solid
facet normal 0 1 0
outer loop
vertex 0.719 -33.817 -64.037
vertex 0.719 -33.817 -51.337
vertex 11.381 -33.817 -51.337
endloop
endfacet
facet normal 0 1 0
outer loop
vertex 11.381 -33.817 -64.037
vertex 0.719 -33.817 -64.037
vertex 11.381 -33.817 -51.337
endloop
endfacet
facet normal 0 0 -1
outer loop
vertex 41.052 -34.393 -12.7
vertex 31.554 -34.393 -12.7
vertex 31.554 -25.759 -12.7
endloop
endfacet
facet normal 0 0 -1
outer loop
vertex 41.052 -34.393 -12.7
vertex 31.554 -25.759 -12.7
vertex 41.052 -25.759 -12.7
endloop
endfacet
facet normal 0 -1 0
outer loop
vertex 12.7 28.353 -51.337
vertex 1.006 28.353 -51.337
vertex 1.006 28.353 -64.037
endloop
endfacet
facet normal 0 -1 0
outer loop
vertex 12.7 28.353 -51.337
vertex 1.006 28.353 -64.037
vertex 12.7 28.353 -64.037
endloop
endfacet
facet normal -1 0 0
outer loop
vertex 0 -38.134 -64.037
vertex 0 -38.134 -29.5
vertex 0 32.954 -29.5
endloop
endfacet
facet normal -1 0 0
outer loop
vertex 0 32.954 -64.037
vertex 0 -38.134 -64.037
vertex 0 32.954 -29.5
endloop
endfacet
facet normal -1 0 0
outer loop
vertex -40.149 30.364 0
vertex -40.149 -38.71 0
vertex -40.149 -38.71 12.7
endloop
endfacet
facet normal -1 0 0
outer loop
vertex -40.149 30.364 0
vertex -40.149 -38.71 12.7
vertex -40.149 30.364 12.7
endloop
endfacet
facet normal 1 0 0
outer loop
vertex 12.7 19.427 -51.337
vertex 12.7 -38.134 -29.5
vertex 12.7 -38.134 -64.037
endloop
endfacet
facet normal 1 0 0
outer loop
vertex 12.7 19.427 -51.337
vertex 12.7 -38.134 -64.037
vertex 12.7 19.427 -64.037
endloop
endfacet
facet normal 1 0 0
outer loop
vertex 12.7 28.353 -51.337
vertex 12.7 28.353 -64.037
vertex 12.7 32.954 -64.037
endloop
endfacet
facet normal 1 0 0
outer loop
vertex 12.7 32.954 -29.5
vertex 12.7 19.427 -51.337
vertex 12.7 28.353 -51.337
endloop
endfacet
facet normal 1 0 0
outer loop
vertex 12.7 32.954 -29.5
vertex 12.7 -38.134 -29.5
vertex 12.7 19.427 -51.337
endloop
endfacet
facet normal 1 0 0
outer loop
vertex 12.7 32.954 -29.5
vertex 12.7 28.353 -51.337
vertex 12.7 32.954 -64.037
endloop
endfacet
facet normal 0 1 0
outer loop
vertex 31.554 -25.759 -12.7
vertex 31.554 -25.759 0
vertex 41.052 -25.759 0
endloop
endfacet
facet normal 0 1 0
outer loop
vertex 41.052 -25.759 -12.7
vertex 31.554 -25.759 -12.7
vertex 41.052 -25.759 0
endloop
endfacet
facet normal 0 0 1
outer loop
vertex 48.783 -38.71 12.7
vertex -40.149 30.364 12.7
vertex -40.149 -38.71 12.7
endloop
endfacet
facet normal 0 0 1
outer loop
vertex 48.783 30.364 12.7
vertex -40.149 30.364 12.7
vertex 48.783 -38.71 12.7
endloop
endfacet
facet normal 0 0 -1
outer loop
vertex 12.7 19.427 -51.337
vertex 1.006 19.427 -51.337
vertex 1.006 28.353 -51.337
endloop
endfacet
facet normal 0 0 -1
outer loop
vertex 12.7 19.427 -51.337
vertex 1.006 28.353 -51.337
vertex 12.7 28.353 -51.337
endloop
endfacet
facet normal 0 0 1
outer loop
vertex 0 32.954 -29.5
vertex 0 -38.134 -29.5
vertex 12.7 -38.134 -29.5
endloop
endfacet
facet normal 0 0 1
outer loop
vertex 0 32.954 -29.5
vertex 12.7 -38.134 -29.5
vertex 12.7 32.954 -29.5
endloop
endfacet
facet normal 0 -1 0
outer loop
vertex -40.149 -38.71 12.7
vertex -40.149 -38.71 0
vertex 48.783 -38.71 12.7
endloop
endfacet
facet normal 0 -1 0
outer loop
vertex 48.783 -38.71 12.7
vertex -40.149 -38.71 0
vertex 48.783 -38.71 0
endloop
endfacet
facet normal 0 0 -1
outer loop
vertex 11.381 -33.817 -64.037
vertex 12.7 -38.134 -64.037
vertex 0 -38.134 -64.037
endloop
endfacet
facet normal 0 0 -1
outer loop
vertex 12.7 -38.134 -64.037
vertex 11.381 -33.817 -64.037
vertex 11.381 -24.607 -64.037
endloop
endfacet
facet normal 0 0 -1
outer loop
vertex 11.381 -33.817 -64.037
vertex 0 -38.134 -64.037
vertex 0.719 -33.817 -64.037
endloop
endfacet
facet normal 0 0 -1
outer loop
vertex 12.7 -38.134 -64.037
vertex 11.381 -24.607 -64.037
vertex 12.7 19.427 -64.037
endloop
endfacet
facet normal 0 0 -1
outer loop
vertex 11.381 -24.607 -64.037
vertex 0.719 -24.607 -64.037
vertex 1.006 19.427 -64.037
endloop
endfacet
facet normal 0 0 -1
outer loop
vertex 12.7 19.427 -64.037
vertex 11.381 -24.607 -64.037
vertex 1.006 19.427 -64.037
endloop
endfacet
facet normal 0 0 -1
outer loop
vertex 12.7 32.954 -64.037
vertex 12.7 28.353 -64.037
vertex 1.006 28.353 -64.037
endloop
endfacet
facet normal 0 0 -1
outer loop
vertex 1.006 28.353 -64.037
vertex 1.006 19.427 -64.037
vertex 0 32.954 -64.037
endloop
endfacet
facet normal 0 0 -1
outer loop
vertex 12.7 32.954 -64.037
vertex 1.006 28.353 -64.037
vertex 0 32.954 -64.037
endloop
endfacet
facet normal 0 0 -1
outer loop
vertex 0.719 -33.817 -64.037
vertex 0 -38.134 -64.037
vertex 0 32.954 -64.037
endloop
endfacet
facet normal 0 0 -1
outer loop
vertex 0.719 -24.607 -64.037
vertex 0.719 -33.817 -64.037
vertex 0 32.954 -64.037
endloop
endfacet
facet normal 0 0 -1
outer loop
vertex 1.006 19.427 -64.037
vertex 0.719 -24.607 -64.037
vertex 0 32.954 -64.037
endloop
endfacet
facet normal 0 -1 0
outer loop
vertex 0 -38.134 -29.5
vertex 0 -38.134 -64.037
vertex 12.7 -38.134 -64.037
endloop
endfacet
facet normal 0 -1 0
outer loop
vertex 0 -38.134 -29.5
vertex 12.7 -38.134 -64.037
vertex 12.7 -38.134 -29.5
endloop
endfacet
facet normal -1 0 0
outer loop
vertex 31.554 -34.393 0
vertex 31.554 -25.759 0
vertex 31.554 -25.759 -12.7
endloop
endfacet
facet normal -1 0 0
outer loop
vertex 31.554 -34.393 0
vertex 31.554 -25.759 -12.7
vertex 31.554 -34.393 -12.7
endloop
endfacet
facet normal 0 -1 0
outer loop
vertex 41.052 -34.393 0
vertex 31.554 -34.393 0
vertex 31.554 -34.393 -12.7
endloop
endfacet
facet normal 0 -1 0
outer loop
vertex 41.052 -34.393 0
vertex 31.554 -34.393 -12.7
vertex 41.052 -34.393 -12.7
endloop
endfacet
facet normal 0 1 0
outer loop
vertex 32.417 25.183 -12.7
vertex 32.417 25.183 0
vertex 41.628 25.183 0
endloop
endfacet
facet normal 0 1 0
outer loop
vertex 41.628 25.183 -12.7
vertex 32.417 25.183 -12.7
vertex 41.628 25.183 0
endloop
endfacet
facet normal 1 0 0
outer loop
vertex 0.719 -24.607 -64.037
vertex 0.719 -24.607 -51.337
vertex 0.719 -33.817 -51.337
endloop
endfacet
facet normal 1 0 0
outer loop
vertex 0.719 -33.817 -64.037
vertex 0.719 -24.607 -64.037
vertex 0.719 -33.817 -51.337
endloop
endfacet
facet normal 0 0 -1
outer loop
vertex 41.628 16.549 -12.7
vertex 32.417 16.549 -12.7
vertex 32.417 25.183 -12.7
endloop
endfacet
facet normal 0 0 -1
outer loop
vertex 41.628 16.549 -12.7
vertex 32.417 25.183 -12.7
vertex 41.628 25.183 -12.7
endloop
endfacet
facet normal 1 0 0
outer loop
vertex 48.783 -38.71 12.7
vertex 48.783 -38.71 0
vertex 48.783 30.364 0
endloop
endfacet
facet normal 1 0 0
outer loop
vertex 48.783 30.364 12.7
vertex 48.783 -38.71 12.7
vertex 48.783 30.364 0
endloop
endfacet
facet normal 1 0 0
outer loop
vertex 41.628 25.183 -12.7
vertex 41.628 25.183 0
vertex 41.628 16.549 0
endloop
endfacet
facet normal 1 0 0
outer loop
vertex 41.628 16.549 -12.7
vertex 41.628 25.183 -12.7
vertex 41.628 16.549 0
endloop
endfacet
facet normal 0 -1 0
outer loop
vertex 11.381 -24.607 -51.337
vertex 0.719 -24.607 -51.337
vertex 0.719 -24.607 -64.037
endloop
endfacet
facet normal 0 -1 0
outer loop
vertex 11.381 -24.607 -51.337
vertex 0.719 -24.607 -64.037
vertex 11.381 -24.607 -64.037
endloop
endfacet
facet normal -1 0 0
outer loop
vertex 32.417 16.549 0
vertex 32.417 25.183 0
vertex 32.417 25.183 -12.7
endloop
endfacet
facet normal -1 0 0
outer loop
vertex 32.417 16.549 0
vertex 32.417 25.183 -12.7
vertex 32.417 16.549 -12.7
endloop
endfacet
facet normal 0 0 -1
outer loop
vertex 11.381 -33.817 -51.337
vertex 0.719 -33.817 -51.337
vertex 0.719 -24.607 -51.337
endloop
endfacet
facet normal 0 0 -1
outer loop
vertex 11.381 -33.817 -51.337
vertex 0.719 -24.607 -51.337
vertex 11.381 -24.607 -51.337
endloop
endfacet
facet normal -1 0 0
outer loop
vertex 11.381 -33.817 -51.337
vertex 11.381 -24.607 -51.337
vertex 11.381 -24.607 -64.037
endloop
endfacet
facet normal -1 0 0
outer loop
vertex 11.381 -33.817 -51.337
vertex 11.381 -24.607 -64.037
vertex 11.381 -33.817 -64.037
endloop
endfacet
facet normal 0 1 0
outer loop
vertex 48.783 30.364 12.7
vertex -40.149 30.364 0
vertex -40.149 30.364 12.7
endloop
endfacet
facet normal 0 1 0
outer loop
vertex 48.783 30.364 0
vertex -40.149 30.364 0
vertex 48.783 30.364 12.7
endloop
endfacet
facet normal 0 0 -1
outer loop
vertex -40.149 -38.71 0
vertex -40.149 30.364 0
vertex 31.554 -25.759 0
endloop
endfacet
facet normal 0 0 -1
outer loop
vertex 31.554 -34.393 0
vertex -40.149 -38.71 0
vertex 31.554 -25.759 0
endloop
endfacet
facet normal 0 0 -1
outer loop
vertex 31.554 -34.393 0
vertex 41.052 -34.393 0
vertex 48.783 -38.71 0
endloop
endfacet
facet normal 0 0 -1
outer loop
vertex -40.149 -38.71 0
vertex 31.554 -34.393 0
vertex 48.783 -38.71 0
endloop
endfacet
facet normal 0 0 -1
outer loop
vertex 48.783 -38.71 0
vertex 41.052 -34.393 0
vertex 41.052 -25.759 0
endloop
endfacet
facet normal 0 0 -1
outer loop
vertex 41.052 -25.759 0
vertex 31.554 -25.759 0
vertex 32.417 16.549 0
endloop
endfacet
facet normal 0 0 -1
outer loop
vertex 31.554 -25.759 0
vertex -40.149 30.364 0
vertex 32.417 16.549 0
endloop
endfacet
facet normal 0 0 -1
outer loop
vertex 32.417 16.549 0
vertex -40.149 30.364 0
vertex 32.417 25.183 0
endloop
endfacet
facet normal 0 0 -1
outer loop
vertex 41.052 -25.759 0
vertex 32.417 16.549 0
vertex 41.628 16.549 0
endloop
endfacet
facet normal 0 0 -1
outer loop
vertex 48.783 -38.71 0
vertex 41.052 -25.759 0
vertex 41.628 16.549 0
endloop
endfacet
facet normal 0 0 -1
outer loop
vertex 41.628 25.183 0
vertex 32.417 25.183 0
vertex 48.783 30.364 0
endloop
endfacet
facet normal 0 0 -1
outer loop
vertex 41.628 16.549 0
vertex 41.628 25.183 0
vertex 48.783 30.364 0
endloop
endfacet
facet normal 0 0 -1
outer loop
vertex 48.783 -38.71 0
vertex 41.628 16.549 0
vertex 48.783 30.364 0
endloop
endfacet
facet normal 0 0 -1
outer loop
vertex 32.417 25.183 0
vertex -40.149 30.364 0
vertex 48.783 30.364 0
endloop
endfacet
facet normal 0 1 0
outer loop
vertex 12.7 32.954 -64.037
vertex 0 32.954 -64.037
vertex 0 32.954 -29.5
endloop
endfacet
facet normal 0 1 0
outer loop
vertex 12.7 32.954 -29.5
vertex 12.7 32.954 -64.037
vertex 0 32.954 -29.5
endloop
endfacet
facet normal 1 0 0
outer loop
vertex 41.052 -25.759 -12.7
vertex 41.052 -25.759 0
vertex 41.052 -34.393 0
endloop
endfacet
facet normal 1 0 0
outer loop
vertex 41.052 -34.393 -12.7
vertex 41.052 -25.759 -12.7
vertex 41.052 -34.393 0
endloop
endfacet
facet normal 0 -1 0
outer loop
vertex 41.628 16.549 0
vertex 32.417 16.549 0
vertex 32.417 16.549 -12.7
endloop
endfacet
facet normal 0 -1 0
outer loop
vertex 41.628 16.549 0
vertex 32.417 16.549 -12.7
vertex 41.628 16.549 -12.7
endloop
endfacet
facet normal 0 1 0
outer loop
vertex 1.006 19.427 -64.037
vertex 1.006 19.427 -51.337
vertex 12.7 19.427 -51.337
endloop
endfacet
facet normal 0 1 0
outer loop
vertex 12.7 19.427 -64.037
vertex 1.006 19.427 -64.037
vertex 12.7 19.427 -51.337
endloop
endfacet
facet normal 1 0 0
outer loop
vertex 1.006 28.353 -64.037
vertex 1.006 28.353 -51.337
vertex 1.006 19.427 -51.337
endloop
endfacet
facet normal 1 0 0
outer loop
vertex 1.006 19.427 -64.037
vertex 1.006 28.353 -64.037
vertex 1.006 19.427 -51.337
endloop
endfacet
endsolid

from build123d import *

# Parameters (mm, degrees)
F0_W     = 88.931978
F0_H     = 69.073383
F1_DEPTH = 12.7
F2_W     = 9.498369
F2_H     = 8.634174
F2_W_2   = 9.210534
F2_H_2   = 8.634172
F3_DEPTH = 12.7
F4_W     = 71.088024
F4_H     = 34.536689
F5_DEPTH = 12.7
F6_W     = 10.661837
F6_H     = 9.209784
F6_W_2   = 11.694036
F6_H_2   = 8.925818
F7_DEPTH = 12.7


with BuildPart() as f1:
    # F0 (on Top) → F1 (new body)
    with BuildSketch(Plane.XY):
        with Locations((4.317086, -4.173183)):
            Rectangle(F0_W, F0_H)
    extrude(amount=F1_DEPTH)

    # F2 (on face) → F3 (join)
    with BuildSketch(Plane(origin=(0, 0, 0), x_dir=(1, 0, 0), z_dir=(0, 0, -1))):
        with Locations((36.30303, 30.075702)):
            Rectangle(F2_W, F2_H)
        with Locations((37.022602, -20.865917)):
            Rectangle(F2_W_2, F2_H_2)
    extrude(amount=F3_DEPTH)


with BuildPart() as f5:
    # F4 (on Right) → F5 (new body)
    with BuildSketch(Plane.YZ):
        with Locations((-2.59025, -46.768434)):
            Rectangle(F4_W, F4_H)
    extrude(amount=F5_DEPTH)

    # F6 (on face) → F7 (cut)
    with BuildSketch(Plane(origin=(0, 0, -64.036779), x_dir=(1, 0, 0), z_dir=(0, 0, -1))):
        with Locations((6.049875, 29.212284)):
            Rectangle(F6_W, F6_H)
        with Locations((6.852982, -23.889797)):
            Rectangle(F6_W_2, F6_H_2)
    extrude(amount=-F7_DEPTH, mode=Mode.SUBTRACT)


solid = Compound([f1.part, f5.part])
